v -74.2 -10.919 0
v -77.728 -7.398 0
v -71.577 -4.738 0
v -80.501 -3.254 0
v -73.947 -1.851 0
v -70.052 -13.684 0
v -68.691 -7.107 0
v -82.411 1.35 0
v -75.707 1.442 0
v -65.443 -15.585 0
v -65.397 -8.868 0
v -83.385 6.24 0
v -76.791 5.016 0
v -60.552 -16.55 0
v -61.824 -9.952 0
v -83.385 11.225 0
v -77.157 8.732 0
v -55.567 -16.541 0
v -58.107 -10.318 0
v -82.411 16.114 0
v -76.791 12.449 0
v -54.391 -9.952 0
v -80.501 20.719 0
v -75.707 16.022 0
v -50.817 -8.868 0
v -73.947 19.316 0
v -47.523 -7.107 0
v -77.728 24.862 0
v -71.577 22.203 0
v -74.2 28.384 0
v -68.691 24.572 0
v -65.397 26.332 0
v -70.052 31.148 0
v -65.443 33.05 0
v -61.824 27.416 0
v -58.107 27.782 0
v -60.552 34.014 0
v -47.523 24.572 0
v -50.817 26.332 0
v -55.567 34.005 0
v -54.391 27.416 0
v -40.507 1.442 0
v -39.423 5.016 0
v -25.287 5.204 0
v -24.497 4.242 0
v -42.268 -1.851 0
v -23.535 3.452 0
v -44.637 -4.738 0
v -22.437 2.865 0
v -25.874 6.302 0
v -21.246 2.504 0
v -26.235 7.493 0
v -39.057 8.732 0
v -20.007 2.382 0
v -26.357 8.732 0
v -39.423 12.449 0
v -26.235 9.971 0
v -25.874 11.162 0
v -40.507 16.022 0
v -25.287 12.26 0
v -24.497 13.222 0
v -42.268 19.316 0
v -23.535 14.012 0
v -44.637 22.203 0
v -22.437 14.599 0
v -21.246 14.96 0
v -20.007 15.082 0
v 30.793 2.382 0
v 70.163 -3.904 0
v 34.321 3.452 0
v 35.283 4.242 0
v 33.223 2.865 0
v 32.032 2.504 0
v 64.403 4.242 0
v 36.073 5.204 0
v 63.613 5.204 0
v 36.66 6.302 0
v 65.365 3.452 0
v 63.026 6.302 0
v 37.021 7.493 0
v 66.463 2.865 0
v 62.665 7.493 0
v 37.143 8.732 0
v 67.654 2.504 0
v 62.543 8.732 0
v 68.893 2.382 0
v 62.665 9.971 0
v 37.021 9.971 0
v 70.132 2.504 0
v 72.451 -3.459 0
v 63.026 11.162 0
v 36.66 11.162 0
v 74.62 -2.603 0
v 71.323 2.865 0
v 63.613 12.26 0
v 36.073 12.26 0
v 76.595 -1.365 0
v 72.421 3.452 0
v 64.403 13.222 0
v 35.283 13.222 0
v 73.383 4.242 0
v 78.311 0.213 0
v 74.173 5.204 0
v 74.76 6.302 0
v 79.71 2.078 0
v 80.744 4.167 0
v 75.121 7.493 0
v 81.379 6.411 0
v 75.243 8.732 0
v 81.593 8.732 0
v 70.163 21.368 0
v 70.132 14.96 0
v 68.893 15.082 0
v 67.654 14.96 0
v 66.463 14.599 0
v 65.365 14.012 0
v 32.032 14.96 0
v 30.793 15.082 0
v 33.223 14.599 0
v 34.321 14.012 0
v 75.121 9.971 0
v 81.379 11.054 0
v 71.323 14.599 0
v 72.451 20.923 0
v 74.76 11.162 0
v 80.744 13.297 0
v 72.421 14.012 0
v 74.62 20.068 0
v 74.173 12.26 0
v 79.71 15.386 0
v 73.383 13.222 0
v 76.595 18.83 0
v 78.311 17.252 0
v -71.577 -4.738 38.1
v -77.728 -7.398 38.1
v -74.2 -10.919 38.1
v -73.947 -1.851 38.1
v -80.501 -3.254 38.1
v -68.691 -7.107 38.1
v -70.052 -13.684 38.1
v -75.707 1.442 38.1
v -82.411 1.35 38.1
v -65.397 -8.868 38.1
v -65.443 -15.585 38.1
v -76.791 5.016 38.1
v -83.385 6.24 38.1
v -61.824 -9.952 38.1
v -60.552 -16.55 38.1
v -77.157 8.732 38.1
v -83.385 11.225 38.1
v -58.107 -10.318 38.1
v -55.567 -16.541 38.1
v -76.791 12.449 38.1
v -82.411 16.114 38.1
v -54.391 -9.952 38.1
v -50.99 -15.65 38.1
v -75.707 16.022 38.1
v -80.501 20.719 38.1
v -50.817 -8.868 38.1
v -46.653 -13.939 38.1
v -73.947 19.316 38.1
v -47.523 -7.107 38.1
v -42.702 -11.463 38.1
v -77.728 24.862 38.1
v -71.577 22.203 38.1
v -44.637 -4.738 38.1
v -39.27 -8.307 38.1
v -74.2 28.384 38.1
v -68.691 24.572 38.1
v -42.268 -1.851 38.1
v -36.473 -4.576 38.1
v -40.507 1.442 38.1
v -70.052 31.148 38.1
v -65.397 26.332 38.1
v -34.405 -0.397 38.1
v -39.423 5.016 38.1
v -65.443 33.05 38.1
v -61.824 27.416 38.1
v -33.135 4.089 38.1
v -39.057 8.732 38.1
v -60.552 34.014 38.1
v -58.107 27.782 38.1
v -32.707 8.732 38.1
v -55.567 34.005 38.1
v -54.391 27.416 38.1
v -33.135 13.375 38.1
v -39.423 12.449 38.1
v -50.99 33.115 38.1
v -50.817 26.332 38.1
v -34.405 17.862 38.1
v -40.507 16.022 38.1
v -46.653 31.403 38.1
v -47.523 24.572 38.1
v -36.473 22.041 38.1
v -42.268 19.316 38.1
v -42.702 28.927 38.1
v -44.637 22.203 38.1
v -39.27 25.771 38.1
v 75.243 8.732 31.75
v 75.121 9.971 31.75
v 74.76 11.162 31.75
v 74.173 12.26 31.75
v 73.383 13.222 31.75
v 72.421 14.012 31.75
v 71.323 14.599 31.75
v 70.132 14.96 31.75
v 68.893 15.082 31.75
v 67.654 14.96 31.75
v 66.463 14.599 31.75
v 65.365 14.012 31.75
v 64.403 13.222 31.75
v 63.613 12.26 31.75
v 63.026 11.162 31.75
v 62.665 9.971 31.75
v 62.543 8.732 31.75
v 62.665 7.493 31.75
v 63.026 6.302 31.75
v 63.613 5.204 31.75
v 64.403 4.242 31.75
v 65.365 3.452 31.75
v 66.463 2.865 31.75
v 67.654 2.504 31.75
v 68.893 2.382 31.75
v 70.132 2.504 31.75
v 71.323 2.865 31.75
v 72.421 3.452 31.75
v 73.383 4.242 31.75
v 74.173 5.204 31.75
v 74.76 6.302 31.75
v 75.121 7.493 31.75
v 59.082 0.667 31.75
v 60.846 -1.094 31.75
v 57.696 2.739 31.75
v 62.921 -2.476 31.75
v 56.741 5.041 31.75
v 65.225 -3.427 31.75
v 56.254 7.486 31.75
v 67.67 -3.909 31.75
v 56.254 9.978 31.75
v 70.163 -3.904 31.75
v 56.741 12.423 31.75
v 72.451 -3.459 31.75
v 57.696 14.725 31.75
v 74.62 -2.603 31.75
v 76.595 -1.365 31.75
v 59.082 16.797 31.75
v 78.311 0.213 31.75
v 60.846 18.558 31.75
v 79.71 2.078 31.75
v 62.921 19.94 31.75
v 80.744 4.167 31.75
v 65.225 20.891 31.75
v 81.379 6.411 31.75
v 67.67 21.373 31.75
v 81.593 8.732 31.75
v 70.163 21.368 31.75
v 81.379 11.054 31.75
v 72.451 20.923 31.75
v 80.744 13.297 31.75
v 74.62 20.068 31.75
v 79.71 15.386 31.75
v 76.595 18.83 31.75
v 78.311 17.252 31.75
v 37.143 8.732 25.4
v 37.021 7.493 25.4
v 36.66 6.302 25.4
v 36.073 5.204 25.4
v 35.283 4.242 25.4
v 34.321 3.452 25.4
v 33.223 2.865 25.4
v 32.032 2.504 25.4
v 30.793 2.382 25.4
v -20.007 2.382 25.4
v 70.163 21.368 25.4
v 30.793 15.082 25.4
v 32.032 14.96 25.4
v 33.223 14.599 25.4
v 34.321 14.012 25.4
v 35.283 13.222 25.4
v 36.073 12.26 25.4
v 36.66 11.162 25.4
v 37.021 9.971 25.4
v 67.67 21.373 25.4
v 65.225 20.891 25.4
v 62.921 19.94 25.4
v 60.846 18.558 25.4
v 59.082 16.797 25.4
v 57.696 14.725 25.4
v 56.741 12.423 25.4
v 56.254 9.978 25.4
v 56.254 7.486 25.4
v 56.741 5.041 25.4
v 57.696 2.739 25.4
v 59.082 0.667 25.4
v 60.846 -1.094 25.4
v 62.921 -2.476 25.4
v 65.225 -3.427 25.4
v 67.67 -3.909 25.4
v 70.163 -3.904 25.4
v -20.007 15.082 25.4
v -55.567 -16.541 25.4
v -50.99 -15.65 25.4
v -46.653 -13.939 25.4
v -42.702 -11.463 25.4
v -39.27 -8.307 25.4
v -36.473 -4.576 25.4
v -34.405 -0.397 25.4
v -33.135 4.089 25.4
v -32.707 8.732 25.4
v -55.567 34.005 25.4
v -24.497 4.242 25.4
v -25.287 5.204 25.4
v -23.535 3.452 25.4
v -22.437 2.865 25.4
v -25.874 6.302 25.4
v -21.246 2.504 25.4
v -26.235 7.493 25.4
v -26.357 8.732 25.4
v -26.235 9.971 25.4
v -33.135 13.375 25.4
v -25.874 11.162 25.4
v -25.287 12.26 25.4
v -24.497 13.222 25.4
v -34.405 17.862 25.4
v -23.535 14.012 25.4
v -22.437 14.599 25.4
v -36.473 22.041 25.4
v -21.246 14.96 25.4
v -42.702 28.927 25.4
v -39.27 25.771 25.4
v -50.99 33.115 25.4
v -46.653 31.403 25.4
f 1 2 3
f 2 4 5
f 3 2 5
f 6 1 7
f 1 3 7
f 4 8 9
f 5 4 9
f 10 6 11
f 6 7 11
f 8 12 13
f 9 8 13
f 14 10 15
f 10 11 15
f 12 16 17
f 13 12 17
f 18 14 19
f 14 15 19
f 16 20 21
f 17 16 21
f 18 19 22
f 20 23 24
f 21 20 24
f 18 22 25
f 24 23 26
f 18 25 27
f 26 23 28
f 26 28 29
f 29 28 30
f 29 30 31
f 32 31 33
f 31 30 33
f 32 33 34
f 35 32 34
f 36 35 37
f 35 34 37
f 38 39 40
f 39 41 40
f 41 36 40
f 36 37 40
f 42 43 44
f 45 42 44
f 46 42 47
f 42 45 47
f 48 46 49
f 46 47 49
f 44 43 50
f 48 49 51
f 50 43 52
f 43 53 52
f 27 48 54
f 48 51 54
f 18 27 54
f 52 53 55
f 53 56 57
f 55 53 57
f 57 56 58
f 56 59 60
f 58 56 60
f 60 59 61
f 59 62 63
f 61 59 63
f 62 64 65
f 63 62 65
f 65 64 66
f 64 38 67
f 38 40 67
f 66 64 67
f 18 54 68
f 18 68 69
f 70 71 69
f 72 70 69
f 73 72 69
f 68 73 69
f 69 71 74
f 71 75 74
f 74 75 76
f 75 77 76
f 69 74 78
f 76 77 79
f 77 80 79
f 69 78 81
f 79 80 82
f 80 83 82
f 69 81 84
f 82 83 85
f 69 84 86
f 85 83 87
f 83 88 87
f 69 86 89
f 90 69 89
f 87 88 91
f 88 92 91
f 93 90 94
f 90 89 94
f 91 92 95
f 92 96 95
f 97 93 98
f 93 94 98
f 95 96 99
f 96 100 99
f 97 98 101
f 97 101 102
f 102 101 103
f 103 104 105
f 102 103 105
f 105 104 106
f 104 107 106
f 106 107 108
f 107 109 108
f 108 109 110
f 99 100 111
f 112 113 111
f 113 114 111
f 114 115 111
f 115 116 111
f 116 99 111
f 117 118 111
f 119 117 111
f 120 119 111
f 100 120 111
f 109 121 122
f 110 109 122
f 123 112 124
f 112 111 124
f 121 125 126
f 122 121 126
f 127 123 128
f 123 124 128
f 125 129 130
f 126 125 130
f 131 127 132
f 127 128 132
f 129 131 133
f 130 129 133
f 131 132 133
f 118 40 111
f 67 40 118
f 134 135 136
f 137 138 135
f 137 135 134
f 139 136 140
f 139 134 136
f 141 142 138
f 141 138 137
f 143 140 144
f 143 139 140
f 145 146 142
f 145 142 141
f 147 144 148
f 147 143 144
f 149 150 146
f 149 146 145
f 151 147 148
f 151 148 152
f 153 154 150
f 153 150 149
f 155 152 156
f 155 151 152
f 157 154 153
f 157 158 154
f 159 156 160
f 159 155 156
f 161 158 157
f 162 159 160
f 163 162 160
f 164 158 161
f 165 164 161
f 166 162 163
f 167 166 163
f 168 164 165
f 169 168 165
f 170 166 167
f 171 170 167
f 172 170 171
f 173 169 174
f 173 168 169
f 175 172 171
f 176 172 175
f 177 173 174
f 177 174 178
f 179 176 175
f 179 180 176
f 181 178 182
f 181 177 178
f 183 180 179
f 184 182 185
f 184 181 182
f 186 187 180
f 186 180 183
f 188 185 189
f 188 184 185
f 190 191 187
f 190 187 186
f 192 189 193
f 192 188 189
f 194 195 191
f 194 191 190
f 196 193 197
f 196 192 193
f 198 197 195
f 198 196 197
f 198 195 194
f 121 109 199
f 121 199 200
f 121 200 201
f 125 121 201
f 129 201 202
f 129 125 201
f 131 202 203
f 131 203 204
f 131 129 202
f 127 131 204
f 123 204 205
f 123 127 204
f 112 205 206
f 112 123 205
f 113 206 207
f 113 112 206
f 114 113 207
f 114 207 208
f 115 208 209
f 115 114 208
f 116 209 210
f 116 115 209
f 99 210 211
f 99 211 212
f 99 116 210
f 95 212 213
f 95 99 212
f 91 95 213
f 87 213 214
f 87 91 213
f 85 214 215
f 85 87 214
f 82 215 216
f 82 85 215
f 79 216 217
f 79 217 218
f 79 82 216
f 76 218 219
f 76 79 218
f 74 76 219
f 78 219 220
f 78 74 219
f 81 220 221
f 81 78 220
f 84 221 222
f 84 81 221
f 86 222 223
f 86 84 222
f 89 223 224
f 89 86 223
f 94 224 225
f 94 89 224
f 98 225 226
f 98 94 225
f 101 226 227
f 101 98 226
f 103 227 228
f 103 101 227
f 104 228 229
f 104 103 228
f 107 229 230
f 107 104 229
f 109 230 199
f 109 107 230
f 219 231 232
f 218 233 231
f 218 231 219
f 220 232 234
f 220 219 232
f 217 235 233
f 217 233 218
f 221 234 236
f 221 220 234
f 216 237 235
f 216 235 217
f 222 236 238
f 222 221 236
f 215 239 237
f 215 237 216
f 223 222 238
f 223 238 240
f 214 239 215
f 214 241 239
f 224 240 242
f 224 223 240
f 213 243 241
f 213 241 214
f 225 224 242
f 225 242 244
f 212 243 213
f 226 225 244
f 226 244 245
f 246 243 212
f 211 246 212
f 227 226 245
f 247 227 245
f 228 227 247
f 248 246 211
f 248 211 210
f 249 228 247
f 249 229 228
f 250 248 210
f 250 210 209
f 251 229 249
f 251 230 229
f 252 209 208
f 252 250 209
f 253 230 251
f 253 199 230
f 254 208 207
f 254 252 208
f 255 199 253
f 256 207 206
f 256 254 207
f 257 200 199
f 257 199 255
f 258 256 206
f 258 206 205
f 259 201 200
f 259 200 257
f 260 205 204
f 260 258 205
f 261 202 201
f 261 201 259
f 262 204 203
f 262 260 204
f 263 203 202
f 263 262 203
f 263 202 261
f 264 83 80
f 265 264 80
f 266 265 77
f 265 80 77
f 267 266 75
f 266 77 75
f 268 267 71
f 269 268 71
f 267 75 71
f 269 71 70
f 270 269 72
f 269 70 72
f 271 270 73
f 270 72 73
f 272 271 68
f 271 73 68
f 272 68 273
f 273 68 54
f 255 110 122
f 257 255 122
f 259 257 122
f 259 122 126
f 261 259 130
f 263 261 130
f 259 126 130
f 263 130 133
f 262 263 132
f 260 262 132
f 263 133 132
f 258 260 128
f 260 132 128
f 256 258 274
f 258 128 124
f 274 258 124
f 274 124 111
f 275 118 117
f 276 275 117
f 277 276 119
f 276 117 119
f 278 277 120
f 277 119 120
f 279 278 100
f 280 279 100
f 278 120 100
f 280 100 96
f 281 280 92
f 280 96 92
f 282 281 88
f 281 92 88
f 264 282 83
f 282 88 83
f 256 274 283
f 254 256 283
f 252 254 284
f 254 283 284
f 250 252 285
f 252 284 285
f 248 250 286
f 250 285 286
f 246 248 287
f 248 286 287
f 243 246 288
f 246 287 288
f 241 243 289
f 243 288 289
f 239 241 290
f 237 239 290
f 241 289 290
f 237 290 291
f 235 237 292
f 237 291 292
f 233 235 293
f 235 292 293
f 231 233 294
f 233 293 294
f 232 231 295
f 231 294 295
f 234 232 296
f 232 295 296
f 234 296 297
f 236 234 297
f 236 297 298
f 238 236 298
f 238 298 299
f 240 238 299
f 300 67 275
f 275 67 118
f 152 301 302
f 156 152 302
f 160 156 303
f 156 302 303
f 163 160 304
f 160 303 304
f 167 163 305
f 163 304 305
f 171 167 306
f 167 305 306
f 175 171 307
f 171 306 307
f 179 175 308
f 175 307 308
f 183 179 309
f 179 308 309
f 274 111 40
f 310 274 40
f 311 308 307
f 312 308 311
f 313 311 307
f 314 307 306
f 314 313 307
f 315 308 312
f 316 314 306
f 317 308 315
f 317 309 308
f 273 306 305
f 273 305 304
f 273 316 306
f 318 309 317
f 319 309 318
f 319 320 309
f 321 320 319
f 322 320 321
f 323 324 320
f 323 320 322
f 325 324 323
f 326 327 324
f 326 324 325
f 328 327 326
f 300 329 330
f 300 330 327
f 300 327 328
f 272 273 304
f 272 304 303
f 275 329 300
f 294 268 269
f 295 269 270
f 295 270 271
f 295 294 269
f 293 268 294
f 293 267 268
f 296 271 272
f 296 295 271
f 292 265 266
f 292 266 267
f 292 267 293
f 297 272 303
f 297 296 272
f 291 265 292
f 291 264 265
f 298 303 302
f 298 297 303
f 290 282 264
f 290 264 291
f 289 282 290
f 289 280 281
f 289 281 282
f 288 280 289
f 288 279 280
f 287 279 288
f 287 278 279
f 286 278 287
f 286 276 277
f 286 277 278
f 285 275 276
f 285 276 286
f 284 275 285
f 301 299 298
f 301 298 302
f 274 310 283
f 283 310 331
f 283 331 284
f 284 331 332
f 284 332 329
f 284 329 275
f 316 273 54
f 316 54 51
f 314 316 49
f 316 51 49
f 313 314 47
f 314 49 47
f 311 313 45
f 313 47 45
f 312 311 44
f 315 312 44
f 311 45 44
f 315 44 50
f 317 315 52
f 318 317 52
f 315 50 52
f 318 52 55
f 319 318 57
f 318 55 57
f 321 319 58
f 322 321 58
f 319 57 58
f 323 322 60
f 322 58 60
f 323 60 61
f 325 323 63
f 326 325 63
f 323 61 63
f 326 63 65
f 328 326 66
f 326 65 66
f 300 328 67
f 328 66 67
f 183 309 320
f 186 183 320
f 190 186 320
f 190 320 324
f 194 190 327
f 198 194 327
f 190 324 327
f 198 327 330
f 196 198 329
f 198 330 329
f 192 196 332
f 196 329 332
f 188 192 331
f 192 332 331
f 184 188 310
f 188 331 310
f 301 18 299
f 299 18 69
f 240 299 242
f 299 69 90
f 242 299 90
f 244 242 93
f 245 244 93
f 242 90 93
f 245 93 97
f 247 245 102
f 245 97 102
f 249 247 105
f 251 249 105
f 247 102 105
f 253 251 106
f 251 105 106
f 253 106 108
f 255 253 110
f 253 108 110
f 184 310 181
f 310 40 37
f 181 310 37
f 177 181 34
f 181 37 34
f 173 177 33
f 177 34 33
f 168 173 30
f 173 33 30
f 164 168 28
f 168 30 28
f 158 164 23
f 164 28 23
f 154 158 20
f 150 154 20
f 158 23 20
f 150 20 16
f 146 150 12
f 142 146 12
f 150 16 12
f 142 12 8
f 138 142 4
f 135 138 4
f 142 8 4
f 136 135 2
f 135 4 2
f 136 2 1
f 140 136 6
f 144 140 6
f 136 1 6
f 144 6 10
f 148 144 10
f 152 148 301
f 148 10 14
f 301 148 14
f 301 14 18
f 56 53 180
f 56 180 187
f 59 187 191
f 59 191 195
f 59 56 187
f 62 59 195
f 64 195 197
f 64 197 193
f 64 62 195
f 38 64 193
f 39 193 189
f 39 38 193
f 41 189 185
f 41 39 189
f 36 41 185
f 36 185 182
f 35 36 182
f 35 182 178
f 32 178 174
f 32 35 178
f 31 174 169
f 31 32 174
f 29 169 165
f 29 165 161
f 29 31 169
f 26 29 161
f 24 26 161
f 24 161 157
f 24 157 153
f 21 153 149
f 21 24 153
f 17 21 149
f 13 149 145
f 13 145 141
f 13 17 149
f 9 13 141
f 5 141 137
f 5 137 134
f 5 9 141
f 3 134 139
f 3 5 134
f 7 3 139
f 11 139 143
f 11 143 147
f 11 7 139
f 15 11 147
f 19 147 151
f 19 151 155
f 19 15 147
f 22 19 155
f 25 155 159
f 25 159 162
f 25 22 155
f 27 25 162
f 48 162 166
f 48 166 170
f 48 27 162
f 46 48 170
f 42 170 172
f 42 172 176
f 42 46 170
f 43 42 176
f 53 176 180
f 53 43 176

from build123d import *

# Parameters (mm, degrees)
F1_DEPTH = 25.4
F0_R     = 19.05
F2_DEPTH = 38.1
F0_R_2   = 6.35
F3_DEPTH = 31.75


with BuildPart() as f1:
    # F0 (on Top) → F1 (new body)
    with BuildSketch(Plane.XY):
        with BuildLine():
            ThreePointArc((-55.567108, 34.004813), (-39.269963, 25.77097), (-32.707108, 8.732132))
            ThreePointArc((-32.707108, 8.732132), (-39.269963, -8.306706), (-55.567108, -16.540549))
            Line((-55.567108, -16.540549), (70.162892, -3.904209))
            ThreePointArc((70.162892, -3.904209), (56.192892, 8.732132), (70.162892, 21.368472))
            Line((70.162892, 21.368472), (-55.567108, 34.004813))
        make_face()
        with BuildLine():
            ThreePointArc((-20.007108, 2.382132), (-26.357108, 8.732132), (-20.007108, 15.082132))
            Line((-20.007108, 15.082132), (30.792892, 15.082132))
            ThreePointArc((30.792892, 15.082132), (35.28302, 13.22226), (37.142892, 8.732132))
            ThreePointArc((37.142892, 8.732132), (35.28302, 4.242004), (30.792892, 2.382132))
            Line((30.792892, 2.382132), (-20.007108, 2.382132))
        make_face(mode=Mode.SUBTRACT)
    extrude(amount=F1_DEPTH)

    # F0 (on Top) → F2 (join)
    with BuildSketch(Plane.XY):
        with BuildLine():
            ThreePointArc((-55.567108, -16.540549), (-39.269963, -8.306706), (-32.707108, 8.732132))
            ThreePointArc((-32.707108, 8.732132), (-39.269963, 25.77097), (-55.567108, 34.004813))
            ThreePointArc((-55.567108, 34.004813), (-83.507108, 8.732132), (-55.567108, -16.540549))
        make_face()
        with Locations((-58.107108, 8.732132)):
            Circle(F0_R, mode=Mode.SUBTRACT)
    extrude(amount=F2_DEPTH)

    # F0 (on Top) → F3 (join)
    with BuildSketch(Plane.XY):
        with BuildLine():
            ThreePointArc((81.592892, 8.732132), (78.311464, 17.251551), (70.162892, 21.368472))
            ThreePointArc((70.162892, 21.368472), (56.192892, 8.732132), (70.162892, -3.904209))
            ThreePointArc((70.162892, -3.904209), (78.311464, 0.212713), (81.592892, 8.732132))
        make_face()
        with Locations((68.892892, 8.732132)):
            Circle(F0_R_2, mode=Mode.SUBTRACT)
    extrude(amount=F3_DEPTH)


solid = f1.part
